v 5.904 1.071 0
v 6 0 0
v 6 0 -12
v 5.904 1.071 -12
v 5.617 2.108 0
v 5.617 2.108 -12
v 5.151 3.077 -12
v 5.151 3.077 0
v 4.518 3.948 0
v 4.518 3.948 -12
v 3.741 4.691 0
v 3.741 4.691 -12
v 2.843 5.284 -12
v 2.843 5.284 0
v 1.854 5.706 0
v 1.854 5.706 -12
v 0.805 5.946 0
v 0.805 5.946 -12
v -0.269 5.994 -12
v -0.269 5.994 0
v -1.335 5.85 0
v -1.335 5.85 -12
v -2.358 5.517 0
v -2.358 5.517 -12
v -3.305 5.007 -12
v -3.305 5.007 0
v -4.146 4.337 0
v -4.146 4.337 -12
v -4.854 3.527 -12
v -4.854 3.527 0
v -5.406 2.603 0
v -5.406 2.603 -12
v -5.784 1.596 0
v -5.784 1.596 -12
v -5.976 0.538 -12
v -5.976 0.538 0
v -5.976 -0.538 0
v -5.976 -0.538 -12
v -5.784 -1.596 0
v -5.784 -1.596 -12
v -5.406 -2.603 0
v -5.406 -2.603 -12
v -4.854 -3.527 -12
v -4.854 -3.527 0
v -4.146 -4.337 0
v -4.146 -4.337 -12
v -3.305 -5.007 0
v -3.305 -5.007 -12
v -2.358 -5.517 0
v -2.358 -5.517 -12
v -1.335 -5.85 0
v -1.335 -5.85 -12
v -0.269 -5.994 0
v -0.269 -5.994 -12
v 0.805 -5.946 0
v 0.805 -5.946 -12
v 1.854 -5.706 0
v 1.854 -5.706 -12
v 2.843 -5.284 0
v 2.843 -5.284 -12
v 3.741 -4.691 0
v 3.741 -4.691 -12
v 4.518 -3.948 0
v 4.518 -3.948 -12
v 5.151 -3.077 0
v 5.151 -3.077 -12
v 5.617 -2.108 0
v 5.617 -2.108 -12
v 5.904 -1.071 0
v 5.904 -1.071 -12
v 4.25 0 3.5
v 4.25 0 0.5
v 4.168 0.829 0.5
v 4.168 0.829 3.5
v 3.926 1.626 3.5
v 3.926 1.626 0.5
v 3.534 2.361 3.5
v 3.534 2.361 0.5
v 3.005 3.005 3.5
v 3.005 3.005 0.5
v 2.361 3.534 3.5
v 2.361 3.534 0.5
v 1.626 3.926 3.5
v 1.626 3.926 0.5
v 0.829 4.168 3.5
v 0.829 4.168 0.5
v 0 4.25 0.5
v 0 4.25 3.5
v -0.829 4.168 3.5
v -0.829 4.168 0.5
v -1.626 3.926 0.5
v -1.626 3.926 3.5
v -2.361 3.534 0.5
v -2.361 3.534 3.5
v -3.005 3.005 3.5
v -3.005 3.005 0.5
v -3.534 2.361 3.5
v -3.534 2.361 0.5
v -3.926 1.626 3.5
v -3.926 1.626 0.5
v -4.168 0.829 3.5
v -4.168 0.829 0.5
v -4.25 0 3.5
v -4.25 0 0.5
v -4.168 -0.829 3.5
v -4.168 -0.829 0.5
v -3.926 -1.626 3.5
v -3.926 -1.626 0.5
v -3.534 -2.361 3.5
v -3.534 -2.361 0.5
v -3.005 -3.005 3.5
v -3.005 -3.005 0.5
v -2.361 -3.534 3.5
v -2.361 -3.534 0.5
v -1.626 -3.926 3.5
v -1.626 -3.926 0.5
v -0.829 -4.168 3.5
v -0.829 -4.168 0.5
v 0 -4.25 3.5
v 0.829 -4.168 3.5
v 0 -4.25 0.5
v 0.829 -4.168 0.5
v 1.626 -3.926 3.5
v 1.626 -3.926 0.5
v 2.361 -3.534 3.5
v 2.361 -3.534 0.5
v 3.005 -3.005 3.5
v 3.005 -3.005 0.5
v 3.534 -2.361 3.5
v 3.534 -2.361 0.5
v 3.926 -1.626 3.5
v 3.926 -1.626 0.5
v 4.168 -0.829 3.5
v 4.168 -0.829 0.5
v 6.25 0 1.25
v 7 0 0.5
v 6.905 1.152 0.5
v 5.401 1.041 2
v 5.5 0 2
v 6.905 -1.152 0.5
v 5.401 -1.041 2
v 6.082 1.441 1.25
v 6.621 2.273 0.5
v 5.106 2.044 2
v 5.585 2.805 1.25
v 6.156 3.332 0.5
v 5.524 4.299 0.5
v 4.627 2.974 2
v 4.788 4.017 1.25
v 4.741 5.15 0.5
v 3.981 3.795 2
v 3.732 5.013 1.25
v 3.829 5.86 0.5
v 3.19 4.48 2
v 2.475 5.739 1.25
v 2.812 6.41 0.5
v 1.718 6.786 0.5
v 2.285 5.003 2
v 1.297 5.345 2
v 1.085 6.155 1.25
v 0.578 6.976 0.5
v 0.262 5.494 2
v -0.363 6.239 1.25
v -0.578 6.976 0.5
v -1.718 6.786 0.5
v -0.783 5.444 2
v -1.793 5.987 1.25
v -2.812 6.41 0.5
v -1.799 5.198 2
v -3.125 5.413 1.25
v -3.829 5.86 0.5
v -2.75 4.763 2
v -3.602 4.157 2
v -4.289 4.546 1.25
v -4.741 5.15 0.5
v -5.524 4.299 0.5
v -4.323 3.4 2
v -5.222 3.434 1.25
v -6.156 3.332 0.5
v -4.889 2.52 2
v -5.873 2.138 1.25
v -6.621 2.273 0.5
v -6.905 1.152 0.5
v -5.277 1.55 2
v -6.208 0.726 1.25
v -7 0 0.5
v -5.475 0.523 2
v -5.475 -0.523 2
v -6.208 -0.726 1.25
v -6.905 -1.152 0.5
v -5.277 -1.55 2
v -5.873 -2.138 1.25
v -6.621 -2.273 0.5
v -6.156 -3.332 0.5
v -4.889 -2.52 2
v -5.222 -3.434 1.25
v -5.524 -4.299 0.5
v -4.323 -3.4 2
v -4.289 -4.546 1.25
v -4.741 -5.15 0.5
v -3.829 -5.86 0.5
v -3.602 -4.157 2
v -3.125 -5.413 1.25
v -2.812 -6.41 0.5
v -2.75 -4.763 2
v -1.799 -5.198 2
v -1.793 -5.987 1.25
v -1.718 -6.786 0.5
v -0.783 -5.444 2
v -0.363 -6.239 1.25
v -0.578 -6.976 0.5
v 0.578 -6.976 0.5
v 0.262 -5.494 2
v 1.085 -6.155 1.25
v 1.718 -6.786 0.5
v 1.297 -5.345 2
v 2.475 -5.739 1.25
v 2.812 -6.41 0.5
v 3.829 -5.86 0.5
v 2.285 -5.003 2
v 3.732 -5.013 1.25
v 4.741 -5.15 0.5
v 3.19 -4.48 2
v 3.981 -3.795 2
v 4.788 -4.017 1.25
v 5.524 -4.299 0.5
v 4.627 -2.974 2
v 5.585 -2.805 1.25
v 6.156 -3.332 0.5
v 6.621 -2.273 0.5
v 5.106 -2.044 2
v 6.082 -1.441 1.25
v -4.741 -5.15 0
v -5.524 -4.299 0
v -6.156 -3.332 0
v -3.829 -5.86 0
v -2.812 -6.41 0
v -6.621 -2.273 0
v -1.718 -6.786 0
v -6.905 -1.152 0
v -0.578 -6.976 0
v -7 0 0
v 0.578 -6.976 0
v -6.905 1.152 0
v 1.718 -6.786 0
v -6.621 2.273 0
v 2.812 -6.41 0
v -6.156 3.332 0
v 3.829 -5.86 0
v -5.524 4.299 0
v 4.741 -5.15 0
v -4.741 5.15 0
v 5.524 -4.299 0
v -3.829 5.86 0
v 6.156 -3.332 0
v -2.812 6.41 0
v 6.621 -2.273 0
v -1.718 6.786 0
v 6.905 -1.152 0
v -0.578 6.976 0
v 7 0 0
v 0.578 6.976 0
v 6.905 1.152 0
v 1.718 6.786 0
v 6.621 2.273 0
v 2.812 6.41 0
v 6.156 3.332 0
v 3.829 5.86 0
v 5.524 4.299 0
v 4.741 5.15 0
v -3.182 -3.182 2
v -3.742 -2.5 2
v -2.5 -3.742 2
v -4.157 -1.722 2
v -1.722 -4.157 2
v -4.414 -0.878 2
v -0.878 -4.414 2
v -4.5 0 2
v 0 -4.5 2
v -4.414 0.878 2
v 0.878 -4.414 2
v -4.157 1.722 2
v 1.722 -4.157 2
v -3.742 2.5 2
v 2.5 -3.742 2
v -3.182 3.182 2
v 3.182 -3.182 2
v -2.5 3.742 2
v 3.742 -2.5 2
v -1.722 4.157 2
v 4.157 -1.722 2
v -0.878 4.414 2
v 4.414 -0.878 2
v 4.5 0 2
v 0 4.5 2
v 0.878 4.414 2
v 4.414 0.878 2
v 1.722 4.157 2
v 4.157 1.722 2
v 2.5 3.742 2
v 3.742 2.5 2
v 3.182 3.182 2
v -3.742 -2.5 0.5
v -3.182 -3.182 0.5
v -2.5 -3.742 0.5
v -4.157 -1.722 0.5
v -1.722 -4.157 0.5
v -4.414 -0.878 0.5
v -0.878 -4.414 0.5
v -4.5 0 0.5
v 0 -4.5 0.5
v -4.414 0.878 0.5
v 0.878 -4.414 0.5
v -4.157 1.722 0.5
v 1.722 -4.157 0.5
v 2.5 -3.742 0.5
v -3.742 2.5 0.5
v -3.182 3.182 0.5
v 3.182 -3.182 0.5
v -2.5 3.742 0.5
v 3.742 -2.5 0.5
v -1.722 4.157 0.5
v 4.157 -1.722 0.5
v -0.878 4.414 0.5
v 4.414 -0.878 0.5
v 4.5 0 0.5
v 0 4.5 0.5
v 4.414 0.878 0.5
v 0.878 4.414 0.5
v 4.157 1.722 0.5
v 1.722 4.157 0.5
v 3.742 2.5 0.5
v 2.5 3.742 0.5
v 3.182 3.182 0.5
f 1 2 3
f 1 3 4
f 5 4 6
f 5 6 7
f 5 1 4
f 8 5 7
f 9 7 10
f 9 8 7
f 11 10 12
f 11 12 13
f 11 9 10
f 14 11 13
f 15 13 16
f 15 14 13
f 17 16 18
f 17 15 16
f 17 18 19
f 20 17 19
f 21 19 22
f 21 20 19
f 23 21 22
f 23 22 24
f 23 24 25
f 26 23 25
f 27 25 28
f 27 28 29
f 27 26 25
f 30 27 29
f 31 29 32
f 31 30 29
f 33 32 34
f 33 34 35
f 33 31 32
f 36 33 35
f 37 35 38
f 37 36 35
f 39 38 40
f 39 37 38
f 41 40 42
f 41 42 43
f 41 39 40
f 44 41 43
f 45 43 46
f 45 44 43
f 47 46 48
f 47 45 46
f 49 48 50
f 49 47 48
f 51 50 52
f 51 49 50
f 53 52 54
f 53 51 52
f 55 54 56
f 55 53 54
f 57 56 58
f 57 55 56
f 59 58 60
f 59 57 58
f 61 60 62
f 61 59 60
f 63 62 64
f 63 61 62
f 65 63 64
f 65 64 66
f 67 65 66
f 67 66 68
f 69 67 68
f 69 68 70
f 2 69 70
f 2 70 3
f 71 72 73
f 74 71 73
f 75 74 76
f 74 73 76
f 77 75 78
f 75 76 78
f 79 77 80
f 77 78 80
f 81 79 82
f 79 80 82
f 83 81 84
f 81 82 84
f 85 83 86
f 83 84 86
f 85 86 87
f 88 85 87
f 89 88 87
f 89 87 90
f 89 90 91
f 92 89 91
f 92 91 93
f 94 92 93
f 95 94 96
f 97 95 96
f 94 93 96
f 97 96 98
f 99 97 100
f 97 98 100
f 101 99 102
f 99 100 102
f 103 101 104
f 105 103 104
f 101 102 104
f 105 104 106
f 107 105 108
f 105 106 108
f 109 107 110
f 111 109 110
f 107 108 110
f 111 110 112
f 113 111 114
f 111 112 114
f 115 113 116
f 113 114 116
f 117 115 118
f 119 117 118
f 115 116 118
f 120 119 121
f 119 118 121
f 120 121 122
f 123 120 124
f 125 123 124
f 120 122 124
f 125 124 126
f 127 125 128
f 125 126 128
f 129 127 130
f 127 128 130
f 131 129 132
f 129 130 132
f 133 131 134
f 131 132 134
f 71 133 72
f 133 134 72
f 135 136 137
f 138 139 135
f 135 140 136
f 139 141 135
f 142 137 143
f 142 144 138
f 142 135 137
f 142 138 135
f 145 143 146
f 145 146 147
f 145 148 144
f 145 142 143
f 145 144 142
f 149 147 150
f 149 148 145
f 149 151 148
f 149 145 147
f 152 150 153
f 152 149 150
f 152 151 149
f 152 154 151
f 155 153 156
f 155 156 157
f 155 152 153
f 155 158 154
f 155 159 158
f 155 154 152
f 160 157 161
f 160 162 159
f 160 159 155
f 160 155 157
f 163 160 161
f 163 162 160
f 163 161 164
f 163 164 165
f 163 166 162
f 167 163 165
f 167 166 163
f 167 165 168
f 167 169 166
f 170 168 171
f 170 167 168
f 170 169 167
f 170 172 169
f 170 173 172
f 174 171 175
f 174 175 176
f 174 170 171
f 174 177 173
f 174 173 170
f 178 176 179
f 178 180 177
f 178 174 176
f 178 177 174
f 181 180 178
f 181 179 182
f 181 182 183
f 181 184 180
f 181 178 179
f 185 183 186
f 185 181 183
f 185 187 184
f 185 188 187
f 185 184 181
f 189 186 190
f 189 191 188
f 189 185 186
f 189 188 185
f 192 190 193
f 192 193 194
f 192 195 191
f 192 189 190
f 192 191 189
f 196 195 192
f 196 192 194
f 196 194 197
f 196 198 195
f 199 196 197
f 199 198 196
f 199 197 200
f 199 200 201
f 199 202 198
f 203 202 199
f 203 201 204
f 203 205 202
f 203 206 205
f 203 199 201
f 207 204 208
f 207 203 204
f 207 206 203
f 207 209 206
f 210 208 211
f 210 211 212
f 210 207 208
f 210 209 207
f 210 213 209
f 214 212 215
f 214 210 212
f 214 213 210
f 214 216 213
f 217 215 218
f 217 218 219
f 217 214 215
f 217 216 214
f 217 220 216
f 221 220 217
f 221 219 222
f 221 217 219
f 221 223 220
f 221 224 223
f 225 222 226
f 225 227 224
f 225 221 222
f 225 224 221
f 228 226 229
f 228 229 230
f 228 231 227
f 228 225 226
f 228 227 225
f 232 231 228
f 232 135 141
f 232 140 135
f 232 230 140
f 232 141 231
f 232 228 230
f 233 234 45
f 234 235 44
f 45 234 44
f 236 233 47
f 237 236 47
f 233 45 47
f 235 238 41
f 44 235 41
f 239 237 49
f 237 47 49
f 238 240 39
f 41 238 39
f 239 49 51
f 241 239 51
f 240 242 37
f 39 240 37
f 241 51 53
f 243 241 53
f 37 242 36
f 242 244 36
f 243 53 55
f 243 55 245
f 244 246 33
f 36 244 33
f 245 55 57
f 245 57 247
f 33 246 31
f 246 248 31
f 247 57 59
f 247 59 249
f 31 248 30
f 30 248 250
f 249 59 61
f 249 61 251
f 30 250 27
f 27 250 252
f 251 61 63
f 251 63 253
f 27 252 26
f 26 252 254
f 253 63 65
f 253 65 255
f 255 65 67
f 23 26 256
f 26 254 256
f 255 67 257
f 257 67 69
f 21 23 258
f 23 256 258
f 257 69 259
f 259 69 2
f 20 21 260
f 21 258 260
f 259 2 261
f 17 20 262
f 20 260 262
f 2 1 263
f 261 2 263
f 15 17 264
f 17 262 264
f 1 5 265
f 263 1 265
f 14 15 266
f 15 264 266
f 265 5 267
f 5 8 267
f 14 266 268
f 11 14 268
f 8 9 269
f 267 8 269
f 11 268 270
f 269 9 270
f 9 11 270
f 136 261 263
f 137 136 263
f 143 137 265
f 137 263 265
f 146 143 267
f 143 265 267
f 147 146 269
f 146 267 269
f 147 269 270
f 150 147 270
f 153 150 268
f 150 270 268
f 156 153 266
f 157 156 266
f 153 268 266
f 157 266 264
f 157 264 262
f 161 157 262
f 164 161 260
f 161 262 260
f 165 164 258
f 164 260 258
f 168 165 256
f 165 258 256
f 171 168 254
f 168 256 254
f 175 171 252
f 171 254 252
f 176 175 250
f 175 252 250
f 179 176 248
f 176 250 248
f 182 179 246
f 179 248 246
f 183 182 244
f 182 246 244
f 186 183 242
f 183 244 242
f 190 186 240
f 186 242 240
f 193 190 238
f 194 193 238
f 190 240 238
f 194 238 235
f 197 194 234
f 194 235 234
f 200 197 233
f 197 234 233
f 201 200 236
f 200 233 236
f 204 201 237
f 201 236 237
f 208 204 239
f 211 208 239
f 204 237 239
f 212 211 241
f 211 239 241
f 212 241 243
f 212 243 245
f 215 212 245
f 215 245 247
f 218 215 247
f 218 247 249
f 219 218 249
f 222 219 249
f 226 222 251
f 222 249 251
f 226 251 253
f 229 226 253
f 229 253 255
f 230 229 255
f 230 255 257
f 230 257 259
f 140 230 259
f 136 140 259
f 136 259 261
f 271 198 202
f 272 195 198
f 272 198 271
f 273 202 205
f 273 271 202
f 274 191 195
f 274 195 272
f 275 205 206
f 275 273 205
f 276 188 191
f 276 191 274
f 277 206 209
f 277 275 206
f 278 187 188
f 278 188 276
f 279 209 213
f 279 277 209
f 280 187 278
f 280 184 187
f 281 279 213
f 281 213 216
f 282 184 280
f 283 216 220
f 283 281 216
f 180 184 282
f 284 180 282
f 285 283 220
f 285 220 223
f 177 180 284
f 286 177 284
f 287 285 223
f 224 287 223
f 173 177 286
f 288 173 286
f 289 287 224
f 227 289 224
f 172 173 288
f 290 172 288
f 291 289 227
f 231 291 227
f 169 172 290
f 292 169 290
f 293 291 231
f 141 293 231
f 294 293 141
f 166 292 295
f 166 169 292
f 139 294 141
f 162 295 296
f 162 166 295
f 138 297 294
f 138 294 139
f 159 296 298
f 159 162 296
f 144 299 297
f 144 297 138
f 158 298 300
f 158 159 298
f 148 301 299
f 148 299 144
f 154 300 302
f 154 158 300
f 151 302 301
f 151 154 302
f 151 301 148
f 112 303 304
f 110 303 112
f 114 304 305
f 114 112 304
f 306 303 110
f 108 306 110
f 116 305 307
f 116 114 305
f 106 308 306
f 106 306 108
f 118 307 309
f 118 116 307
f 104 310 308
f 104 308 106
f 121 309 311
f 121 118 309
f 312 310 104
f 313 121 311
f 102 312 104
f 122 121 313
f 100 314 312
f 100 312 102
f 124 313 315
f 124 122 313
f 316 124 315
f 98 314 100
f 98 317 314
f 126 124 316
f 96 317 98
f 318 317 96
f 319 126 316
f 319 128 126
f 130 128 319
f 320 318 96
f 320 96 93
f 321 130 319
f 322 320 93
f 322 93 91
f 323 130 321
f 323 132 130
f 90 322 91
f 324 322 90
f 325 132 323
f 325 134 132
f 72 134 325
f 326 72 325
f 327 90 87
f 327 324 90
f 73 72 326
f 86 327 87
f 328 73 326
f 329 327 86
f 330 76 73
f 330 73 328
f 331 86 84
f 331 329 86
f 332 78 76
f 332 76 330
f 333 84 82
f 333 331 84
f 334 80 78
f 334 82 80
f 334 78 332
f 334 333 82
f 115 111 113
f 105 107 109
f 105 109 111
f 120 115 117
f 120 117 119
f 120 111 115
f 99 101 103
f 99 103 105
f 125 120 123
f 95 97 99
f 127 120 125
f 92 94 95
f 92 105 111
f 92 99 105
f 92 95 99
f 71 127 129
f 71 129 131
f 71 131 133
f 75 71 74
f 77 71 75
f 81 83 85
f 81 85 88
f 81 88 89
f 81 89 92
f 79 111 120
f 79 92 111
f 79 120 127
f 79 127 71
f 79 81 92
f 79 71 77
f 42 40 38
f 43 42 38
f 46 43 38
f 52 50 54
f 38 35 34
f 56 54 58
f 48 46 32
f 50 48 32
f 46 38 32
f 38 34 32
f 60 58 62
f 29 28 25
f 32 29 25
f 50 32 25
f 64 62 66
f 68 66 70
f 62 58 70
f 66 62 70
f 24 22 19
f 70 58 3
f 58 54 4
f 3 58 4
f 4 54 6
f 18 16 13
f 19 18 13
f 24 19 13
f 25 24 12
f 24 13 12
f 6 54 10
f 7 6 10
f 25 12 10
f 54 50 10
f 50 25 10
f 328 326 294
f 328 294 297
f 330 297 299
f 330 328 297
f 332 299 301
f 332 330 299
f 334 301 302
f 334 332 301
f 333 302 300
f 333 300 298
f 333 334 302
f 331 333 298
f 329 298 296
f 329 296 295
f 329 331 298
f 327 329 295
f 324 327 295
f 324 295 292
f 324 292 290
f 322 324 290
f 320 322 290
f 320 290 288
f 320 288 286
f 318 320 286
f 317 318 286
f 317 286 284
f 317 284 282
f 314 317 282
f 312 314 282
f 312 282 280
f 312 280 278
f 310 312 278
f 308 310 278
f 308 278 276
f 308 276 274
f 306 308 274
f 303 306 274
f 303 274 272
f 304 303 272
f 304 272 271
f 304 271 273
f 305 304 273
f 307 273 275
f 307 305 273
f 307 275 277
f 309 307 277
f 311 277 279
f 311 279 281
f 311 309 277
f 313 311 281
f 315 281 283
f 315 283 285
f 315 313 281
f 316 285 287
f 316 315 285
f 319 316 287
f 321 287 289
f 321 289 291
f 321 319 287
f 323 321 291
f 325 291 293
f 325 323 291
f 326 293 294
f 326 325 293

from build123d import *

# Parameters (mm, degrees)
F0_R     = 7
F0_R_2   = 6
F0_R_3   = 4.5
F1_DEPTH = 2
F2_SIZE  = 1.5
F3_DEPTH = 0.5
F4_R     = 4.25
F5_DEPTH = 3
F6_DEPTH = 12


with BuildPart() as f1:
    # F0 (on Top) → F1 (new body)
    with BuildSketch(Plane.XY):
        Circle(F0_R)
        Circle(F0_R_2, mode=Mode.SUBTRACT)
        Circle(F0_R_2)
        Circle(F0_R_3, mode=Mode.SUBTRACT)
    extrude(amount=F1_DEPTH)

    # F2
    f2_edges = [f1.edges().sort_by_distance(p)[0] for p in [
        (-7, 0, 2),
    ]]
    chamfer(f2_edges, length=F2_SIZE)

    # F0 (on Top) → F3 (join)
    with BuildSketch(Plane.XY):
        Circle(F0_R_3)
    extrude(amount=F3_DEPTH)

    # F4 (on face) → F5 (join)
    with BuildSketch(Plane.XY.offset(0.5)):
        Circle(F4_R)
    extrude(amount=F5_DEPTH)

    # F0 (on Top) → F6 (join)
    with BuildSketch(Plane.XY):
        Circle(F0_R_2)
        Circle(F0_R_3, mode=Mode.SUBTRACT)
        Circle(F0_R_3)
    extrude(amount=-F6_DEPTH)


solid = f1.part
